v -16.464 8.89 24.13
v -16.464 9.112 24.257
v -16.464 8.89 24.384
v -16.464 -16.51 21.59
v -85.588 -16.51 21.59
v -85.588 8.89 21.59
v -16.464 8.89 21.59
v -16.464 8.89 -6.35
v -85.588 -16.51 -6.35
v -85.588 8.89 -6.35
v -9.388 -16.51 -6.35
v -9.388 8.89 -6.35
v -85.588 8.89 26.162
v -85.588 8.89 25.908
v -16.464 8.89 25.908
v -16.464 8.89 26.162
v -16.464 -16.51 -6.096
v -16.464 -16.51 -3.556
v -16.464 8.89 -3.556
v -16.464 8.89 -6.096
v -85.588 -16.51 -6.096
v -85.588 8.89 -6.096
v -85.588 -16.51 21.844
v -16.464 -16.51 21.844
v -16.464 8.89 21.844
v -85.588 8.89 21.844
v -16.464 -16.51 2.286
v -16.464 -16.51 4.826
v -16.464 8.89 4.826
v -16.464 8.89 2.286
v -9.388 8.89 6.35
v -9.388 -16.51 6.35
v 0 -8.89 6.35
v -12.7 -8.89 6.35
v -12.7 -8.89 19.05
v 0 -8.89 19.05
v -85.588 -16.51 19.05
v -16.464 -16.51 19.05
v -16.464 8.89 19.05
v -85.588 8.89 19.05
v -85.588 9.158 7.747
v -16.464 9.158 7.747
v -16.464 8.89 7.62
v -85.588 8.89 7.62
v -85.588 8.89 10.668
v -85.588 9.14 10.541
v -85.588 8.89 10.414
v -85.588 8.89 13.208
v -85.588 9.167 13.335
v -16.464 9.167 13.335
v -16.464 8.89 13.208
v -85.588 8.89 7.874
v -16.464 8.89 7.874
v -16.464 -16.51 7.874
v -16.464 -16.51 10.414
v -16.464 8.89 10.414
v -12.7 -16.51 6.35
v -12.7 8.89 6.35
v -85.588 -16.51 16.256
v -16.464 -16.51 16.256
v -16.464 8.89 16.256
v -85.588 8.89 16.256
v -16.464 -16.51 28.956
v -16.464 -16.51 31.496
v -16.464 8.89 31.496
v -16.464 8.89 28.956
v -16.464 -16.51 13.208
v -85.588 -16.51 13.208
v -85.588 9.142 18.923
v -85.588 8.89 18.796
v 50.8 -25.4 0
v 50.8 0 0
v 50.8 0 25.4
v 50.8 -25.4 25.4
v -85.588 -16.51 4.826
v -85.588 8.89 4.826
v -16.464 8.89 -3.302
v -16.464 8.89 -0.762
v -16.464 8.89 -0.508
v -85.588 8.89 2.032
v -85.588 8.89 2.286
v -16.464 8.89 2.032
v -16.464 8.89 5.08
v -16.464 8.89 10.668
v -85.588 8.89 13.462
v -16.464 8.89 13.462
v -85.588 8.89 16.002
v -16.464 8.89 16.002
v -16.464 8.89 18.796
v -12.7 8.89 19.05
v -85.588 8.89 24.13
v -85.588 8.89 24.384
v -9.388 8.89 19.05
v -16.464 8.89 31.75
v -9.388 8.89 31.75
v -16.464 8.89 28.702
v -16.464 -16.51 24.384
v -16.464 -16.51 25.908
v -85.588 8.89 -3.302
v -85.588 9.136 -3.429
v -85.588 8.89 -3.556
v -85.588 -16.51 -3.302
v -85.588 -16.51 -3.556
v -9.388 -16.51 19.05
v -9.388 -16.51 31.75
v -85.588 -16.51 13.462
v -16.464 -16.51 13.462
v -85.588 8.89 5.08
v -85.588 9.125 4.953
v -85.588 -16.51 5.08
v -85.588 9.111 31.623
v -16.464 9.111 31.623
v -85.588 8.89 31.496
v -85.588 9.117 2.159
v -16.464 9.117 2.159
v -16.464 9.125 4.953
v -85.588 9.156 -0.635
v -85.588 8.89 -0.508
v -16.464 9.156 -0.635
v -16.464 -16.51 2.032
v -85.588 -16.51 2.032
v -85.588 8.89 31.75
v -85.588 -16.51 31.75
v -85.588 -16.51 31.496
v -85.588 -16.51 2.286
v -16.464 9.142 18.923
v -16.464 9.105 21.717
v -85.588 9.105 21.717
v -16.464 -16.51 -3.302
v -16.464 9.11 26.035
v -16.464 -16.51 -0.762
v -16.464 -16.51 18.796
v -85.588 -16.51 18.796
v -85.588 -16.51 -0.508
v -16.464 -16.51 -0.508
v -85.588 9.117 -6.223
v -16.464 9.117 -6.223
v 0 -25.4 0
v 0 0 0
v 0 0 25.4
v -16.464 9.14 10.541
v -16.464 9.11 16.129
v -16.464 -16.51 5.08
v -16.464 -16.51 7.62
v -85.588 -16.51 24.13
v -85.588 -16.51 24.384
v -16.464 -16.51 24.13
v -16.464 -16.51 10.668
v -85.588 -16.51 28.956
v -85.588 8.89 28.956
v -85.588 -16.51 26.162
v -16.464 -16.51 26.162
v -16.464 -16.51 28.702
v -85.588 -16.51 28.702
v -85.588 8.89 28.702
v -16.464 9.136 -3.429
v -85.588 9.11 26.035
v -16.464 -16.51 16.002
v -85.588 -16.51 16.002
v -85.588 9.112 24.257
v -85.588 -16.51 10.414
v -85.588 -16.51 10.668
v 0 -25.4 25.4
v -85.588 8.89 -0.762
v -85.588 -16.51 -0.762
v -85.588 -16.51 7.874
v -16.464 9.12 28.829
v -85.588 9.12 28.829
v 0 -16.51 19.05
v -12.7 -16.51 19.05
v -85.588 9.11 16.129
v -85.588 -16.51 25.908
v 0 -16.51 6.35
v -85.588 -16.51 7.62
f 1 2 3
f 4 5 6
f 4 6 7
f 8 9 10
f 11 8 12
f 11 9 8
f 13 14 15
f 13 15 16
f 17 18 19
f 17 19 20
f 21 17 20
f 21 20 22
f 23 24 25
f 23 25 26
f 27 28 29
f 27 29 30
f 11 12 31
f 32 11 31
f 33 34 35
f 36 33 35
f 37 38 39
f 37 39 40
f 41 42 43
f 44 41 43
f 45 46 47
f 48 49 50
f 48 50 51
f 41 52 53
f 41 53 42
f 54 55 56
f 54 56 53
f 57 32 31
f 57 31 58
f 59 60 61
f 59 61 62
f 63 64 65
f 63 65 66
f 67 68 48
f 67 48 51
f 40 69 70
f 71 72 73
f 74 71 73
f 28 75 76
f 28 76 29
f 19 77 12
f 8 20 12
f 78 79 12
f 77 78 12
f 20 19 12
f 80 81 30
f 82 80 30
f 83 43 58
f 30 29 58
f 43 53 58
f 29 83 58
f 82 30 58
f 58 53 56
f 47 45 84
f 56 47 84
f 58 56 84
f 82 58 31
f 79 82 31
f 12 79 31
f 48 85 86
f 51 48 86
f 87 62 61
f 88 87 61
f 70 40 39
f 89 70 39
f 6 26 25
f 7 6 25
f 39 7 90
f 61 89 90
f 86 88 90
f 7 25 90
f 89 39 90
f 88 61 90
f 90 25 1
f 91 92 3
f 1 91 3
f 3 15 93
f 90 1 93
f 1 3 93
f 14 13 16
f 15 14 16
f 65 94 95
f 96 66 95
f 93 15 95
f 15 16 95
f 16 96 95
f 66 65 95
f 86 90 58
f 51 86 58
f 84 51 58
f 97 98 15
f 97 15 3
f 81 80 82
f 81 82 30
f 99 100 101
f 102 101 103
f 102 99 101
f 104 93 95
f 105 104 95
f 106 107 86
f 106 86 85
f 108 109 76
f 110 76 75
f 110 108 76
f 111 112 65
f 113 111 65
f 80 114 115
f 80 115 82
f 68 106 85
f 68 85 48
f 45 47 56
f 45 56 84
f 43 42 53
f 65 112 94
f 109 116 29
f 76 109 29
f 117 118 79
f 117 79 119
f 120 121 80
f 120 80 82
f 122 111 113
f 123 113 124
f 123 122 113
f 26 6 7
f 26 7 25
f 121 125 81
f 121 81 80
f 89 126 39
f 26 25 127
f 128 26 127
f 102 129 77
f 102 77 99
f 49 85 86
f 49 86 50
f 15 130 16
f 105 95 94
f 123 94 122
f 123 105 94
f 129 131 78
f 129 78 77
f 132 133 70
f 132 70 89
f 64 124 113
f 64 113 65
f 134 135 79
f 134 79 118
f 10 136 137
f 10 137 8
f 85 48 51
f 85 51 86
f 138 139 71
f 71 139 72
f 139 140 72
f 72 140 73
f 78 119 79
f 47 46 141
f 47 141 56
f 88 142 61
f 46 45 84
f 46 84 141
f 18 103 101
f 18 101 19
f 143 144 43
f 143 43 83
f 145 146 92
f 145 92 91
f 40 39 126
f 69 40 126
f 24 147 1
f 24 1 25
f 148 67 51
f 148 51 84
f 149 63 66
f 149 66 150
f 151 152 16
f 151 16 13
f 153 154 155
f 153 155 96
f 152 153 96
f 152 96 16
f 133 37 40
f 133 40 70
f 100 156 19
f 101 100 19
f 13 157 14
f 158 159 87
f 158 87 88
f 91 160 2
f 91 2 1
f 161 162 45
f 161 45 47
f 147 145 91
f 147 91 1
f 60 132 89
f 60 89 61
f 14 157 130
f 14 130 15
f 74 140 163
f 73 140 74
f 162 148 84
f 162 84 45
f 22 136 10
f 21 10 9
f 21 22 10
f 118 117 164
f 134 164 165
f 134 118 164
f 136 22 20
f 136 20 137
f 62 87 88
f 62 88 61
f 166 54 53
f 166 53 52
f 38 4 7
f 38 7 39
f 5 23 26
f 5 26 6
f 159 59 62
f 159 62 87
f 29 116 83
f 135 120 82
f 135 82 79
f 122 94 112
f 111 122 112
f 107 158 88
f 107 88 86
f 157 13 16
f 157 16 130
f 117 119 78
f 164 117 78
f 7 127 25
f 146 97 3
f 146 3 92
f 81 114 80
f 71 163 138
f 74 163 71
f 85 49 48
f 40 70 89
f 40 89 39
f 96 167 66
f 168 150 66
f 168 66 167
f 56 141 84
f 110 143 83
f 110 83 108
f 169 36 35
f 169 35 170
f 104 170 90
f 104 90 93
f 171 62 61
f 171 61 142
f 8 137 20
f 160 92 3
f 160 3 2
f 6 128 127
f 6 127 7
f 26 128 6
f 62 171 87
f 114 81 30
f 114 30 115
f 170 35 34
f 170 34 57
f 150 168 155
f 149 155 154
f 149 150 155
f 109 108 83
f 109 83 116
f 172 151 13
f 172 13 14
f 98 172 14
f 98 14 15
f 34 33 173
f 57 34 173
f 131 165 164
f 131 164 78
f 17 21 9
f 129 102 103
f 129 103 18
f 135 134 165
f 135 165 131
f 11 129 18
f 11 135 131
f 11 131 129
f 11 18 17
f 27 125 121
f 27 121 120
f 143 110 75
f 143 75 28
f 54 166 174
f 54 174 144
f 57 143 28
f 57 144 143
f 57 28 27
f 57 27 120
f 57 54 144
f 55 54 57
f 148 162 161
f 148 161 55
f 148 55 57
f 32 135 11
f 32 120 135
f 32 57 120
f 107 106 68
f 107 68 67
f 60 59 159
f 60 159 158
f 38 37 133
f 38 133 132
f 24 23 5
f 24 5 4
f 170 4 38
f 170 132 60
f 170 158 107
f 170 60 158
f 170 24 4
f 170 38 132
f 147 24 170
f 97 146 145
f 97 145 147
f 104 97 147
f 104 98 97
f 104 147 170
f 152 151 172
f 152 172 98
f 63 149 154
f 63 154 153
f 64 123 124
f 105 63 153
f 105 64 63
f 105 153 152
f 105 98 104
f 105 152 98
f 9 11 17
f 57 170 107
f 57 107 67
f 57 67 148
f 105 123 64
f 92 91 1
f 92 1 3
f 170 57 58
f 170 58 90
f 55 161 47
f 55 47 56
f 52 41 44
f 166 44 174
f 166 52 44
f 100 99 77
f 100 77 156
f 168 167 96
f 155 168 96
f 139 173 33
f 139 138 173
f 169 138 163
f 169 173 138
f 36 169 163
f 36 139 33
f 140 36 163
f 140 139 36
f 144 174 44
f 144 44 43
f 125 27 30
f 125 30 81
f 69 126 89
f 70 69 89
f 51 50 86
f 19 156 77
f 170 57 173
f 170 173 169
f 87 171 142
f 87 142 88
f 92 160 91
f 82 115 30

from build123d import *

# Parameters (mm, degrees)
F0_W      = 50.8
F0_H      = 25.4
F1_DEPTH  = 25.4
F2_W      = 7.62
F2_H      = 12.7
F3_DEPTH  = 12.7
F5_DEPTH  = 25.4
F7_DEPTH  = 69.12356
F22_DEPTH = 69.12356
F23_DEPTH = 69.12356
F24_DEPTH = 69.12356
F25_DEPTH = 69.12356
F26_DEPTH = 69.12356
F27_DEPTH = 69.12356
F28_DEPTH = 69.12356
F29_DEPTH = 69.12356
F30_DEPTH = 69.12356
F31_DEPTH = 69.12356
F32_DEPTH = 69.12356
F33_DEPTH = 69.12356
F34_DEPTH = 69.12356
F35_DEPTH = 69.12356


with BuildPart() as f1:
    # F0 (on Front) → F1 (new body)
    with BuildSketch(Plane.XZ):
        with Locations((25.4, 12.7)):
            Rectangle(F0_W, F0_H)
    extrude(amount=F1_DEPTH)

    # F2 (on face) → F3 (join)
    with BuildSketch(Plane(origin=(0, 0, 0), x_dir=(0, -1, 0), z_dir=(-1, 0, 0))):
        with Locations((12.7, 12.7)):
            Rectangle(F2_W, F2_H)
    extrude(amount=F3_DEPTH)


with BuildPart() as f5:
    # F4 (on face) → F5 (new body)
    with BuildSketch(Plane.XZ.offset(16.51)):
        Polygon((-85.587695, -6.35), (-9.387695, -6.35), (-9.387695, 6.35), (-12.7, 6.35), (-12.7, 19.05), (-9.387695, 19.05), (-9.387695, 31.75), (-16.464371, 31.75), (-85.587695, 31.75), (-85.587695, 31.496), (-16.464371, 31.496), (-16.464371, 28.956), (-85.587695, 28.956), (-85.587695, 28.702), (-16.464371, 28.702), (-16.464371, 26.162), (-85.587695, 26.162), (-85.587695, 25.908), (-16.464371, 25.908), (-16.464371, 24.384), (-85.587695, 24.384), (-85.587695, 24.13), (-16.464371, 24.13), (-16.464371, 21.844), (-85.587695, 21.844), (-85.587695, 21.59), (-16.464371, 21.59), (-16.464371, 19.05), (-85.587695, 19.05), (-85.587695, 18.796), (-16.464371, 18.796), (-16.464371, 16.256), (-85.587695, 16.256), (-85.587695, 16.002), (-16.464371, 16.002), (-16.464371, 13.462), (-85.587695, 13.462), (-85.587695, 13.208), (-16.464371, 13.208), (-16.464371, 10.668), (-85.587695, 10.668), (-85.587695, 10.414), (-16.464371, 10.414), (-16.464371, 7.874), (-85.587695, 7.874), (-85.587695, 7.62), (-16.464371, 7.62), (-16.464371, 5.08), (-85.587695, 5.08), (-85.587695, 4.826), (-16.464371, 4.826), (-16.464371, 2.286), (-85.587695, 2.286), (-85.587695, 2.032), (-16.464371, 2.032), (-16.464371, -0.508), (-85.587695, -0.508), (-85.587695, -0.762), (-16.464371, -0.762), (-16.464371, -3.302), (-85.587695, -3.302), (-85.587695, -3.556), (-16.464371, -3.556), (-16.464371, -6.096), (-85.587695, -6.096), align=None)
    extrude(amount=-F5_DEPTH)

    # F6 (on face) → F7 (join)
    with BuildSketch(Plane(origin=(-85.587695, 0, 0), x_dir=(0, -1, 0), z_dir=(-1, 0, 0))):
        Polygon((-8.89, 31.496), (-8.89, 31.75), (-9.111261, 31.623), align=None)
    extrude(amount=-F7_DEPTH)

    # F8 (on face) → F22 (join)
    with BuildSketch(Plane(origin=(-85.587695, 0, 0), x_dir=(0, -1, 0), z_dir=(-1, 0, 0))):
        Polygon((-8.89, 28.702), (-8.89, 28.956), (-9.119693, 28.829), align=None)
    extrude(amount=-F22_DEPTH)

    # F16 (on face) → F30 (join)
    with BuildSketch(Plane(origin=(-85.587695, 0, 0), x_dir=(0, -1, 0), z_dir=(-1, 0, 0))):
        Polygon((-8.89, 7.62), (-8.89, 7.874), (-9.158145, 7.747), align=None)
    extrude(amount=-F30_DEPTH)

    # F17 (on face) → F31 (join)
    with BuildSketch(Plane(origin=(-85.587695, 0, 0), x_dir=(0, -1, 0), z_dir=(-1, 0, 0))):
        Polygon((-8.89, 4.826), (-8.89, 5.08), (-9.125492, 4.953), align=None)
    extrude(amount=-F31_DEPTH)

    # F19 (on face) → F33 (join)
    with BuildSketch(Plane(origin=(-85.587695, 0, 0), x_dir=(0, -1, 0), z_dir=(-1, 0, 0))):
        Polygon((-8.89, -0.762), (-8.89, -0.508), (-9.155607, -0.635), align=None)
    extrude(amount=-F33_DEPTH)

    # F20 (on face) → F34 (join)
    with BuildSketch(Plane(origin=(-85.587695, 0, 0), x_dir=(0, -1, 0), z_dir=(-1, 0, 0))):
        Polygon((-8.89, -3.556), (-8.89, -3.302), (-9.136191, -3.429), align=None)
    extrude(amount=-F34_DEPTH)

    # F21 (on face) → F35 (join)
    with BuildSketch(Plane(origin=(-85.587695, 0, 0), x_dir=(0, -1, 0), z_dir=(-1, 0, 0))):
        Polygon((-8.89, -6.35), (-8.89, -6.096), (-9.116775, -6.223), align=None)
    extrude(amount=-F35_DEPTH)


with BuildPart() as f23:
    # F9 (on face) → F23 (new body)
    with BuildSketch(Plane(origin=(-85.587695, 0, 0), x_dir=(0, -1, 0), z_dir=(-1, 0, 0))):
        Polygon((-8.89, 25.908), (-8.89, 26.162), (-9.10997, 26.035), align=None)
    extrude(amount=-F23_DEPTH)


with BuildPart() as f24:
    # F10 (on face) → F24 (new body)
    with BuildSketch(Plane(origin=(-85.587695, 0, 0), x_dir=(0, -1, 0), z_dir=(-1, 0, 0))):
        Polygon((-8.89, 24.13), (-8.89, 24.384), (-9.11242, 24.257), align=None)
    extrude(amount=-F24_DEPTH)


with BuildPart() as f25:
    # F11 (on face) → F25 (new body)
    with BuildSketch(Plane(origin=(-85.587695, 0, 0), x_dir=(0, -1, 0), z_dir=(-1, 0, 0))):
        Polygon((-8.89, 21.59), (-8.89, 21.844), (-9.105149, 21.717), align=None)
    extrude(amount=-F25_DEPTH)


with BuildPart() as f26:
    # F12 (on face) → F26 (new body)
    with BuildSketch(Plane(origin=(-85.587695, 0, 0), x_dir=(0, -1, 0), z_dir=(-1, 0, 0))):
        Polygon((-8.89, 18.796), (-8.89, 19.05), (-9.141512, 18.923), align=None)
    extrude(amount=-F26_DEPTH)


with BuildPart() as f27:
    # F13 (on face) → F27 (new body)
    with BuildSketch(Plane(origin=(-85.587695, 0, 0), x_dir=(0, -1, 0), z_dir=(-1, 0, 0))):
        Polygon((-8.89, 16.002), (-8.89, 16.256), (-9.10997, 16.129), align=None)
    extrude(amount=-F27_DEPTH)


with BuildPart() as f28:
    # F14 (on face) → F28 (new body)
    with BuildSketch(Plane(origin=(-85.587695, 0, 0), x_dir=(0, -1, 0), z_dir=(-1, 0, 0))):
        Polygon((-8.89, 13.208), (-8.89, 13.462), (-9.167424, 13.335), align=None)
    extrude(amount=-F28_DEPTH)


with BuildPart() as f29:
    # F15 (on face) → F29 (new body)
    with BuildSketch(Plane(origin=(-85.587695, 0, 0), x_dir=(0, -1, 0), z_dir=(-1, 0, 0))):
        Polygon((-8.89, 10.414), (-8.89, 10.668), (-9.140471, 10.541), align=None)
    extrude(amount=-F29_DEPTH)


with BuildPart() as f32:
    # F18 (on face) → F32 (new body)
    with BuildSketch(Plane(origin=(-85.587695, 0, 0), x_dir=(0, -1, 0), z_dir=(-1, 0, 0))):
        Polygon((-8.89, 2.032), (-8.89, 2.286), (-9.116775, 2.159), align=None)
    extrude(amount=-F32_DEPTH)


solid = Compound([f1.part, f5.part, f23.part, f24.part, f25.part, f26.part, f27.part, f28.part, f29.part, f32.part])
